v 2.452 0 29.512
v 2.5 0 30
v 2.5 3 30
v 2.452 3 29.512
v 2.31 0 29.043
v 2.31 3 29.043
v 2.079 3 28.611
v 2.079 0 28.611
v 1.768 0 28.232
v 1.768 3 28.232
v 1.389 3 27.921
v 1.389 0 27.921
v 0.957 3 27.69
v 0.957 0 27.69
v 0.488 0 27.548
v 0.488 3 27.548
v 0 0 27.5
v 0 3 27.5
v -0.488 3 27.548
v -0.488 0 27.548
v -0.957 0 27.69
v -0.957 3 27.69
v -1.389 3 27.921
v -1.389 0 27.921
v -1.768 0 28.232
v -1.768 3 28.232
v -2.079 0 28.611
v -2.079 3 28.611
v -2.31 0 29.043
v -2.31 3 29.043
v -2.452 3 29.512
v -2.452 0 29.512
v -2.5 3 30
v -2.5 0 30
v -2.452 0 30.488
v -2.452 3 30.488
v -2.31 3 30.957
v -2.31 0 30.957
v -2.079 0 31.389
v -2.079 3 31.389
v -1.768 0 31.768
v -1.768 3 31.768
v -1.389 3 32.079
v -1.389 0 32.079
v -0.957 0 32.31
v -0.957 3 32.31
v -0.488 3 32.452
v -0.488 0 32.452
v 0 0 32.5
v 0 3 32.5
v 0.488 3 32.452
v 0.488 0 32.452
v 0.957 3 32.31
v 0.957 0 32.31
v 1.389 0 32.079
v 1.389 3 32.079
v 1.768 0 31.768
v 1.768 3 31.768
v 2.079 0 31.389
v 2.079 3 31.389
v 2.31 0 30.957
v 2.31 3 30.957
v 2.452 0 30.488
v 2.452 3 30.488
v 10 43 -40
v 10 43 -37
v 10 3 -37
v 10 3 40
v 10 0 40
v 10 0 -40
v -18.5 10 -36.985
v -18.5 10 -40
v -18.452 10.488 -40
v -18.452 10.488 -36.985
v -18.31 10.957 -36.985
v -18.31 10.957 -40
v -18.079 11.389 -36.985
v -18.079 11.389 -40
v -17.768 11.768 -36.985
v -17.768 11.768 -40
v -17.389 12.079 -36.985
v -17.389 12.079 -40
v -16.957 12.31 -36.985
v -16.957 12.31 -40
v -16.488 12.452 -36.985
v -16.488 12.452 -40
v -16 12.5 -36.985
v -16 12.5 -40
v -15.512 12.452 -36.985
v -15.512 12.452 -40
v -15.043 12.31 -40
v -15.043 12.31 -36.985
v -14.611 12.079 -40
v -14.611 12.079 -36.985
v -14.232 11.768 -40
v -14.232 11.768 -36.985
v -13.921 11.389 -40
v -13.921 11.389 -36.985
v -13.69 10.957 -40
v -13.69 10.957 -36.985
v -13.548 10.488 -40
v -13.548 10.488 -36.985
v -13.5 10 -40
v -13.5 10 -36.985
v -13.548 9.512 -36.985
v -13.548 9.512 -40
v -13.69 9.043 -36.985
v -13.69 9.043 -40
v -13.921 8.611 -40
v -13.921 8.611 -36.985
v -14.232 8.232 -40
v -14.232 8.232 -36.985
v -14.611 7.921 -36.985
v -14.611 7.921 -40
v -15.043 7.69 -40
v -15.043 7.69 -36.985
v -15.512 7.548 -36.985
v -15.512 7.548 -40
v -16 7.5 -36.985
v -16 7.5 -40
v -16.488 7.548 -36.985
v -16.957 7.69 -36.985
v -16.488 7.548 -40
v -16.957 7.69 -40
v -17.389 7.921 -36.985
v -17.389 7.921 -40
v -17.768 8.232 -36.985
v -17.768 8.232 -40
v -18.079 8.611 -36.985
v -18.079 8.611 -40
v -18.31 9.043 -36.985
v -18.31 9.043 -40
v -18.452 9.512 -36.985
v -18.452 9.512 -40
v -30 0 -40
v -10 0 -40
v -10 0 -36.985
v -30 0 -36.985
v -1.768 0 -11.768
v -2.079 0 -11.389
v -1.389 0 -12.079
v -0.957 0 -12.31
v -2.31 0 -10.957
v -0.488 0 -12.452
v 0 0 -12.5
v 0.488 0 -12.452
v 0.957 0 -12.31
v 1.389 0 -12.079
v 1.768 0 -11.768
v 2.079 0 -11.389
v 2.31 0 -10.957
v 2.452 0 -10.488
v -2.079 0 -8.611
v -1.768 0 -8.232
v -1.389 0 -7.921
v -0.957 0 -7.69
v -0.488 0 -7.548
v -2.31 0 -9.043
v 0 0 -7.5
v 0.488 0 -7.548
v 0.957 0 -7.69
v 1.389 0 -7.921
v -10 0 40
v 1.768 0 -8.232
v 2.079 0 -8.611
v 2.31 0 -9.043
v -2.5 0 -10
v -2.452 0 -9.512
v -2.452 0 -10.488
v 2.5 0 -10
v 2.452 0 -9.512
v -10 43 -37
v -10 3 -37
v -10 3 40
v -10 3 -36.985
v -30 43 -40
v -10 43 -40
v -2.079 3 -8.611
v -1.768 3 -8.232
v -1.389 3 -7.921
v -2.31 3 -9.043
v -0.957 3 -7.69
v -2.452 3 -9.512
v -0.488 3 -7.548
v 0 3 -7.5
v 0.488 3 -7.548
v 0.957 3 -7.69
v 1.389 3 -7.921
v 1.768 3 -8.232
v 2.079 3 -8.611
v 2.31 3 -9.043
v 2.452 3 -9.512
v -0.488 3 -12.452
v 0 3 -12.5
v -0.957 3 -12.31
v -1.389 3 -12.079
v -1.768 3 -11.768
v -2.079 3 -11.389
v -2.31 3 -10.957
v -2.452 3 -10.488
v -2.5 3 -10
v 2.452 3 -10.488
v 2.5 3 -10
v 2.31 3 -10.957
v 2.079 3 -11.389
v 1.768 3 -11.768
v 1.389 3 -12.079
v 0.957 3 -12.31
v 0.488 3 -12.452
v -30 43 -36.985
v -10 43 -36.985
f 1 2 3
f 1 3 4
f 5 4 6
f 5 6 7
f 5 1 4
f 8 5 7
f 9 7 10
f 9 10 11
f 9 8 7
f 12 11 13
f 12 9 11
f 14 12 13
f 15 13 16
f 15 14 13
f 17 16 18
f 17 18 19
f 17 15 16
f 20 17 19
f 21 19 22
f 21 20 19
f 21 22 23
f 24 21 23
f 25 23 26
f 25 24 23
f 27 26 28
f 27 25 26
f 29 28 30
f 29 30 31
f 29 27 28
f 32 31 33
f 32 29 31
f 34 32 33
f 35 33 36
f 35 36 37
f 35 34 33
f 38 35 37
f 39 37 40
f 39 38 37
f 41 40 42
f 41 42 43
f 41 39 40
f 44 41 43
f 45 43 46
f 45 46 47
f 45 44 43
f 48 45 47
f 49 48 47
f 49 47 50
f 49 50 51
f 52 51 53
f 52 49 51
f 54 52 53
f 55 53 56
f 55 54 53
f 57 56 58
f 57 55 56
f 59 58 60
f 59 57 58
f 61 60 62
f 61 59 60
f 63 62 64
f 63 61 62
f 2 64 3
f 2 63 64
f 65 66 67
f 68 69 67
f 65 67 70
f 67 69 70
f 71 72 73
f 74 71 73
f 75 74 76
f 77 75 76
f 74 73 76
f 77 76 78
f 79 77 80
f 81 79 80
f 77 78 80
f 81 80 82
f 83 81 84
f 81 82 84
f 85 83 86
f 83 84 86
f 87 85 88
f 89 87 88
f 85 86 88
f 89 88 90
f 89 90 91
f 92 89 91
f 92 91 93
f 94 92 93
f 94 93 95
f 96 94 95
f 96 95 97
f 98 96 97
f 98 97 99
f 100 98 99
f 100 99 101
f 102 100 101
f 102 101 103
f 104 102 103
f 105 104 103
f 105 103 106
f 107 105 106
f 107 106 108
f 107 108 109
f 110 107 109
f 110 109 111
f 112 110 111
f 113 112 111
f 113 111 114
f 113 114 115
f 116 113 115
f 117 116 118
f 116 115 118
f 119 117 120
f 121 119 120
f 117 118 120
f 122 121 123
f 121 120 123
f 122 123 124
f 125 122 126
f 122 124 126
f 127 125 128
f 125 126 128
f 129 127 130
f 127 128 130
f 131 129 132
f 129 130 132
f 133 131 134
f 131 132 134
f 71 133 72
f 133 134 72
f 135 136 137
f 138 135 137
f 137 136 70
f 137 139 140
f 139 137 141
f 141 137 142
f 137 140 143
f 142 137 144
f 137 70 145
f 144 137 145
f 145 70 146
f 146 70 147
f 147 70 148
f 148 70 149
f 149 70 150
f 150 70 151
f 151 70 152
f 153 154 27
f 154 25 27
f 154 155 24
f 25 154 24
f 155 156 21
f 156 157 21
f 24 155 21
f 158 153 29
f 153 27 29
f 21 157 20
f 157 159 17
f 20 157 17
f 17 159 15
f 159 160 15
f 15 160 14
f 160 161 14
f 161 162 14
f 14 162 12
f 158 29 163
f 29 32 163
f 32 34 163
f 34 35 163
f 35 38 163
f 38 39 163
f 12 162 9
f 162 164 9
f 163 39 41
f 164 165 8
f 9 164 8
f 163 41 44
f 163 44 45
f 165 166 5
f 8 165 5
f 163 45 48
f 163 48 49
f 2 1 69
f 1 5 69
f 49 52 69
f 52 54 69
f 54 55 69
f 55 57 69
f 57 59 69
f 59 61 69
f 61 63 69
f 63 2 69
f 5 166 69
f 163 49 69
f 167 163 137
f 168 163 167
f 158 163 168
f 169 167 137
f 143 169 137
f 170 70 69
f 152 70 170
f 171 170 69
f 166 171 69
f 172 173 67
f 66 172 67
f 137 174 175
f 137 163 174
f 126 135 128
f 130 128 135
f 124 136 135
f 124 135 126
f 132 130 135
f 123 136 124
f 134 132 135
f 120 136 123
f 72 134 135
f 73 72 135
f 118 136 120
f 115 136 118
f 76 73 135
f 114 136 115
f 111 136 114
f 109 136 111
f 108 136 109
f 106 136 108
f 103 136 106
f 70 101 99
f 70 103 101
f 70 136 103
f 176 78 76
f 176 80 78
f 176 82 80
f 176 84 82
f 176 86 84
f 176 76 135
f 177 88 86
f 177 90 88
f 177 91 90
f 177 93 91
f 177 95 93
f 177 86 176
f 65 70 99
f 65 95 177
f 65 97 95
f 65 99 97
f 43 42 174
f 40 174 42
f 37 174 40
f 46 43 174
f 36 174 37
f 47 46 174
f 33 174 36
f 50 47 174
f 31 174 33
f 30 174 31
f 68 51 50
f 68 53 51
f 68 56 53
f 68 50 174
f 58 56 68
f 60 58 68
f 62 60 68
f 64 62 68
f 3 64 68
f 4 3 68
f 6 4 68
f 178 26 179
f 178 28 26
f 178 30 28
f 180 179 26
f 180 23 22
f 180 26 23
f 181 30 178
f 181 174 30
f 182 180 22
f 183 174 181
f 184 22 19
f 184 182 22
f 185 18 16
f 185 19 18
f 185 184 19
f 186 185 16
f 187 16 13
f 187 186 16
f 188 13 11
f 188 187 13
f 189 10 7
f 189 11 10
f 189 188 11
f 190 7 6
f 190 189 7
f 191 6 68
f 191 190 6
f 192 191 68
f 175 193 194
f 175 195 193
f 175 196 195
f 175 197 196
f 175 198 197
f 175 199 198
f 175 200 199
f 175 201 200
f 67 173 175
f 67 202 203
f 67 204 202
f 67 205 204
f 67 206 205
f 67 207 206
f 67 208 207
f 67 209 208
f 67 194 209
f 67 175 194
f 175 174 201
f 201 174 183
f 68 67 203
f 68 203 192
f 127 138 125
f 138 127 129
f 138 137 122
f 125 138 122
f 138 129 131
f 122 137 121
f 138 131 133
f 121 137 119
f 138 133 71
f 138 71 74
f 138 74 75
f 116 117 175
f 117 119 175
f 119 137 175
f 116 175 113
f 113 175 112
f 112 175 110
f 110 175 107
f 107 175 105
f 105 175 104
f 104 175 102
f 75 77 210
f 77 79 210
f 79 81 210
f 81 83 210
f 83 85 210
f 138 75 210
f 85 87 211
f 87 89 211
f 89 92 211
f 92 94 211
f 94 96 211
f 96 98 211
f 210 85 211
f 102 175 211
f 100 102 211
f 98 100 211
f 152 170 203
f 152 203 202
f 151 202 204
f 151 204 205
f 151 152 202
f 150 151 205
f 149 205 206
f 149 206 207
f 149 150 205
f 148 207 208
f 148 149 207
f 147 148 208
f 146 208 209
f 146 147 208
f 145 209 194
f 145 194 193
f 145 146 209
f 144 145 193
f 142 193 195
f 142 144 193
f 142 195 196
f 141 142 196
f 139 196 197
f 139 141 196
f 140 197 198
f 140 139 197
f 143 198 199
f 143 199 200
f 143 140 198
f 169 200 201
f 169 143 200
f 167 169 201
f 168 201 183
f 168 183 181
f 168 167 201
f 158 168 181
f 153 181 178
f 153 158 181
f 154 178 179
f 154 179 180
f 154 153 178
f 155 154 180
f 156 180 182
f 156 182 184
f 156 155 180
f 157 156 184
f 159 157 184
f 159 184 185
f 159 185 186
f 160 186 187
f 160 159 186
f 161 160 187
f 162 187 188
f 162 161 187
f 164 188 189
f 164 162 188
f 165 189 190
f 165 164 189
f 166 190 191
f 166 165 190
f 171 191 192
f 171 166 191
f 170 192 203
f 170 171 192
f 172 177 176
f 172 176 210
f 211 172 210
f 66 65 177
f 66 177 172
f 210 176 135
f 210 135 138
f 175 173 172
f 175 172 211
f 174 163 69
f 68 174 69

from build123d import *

# Parameters (mm, degrees)
SKETCH1_W           = 20
SKETCH1_H           = 80
SKETCH1_R           = 2.5
BOSS_EXTRUDE1_DEPTH = 3
SKETCH2_W           = 20
SKETCH2_H           = 3
BOSS_EXTRUDE2_DEPTH = 40
SKETCH4_W           = 3.015323491
SKETCH4_H           = 43
BOSS_EXTRUDE4_DEPTH = 20
SKETCH7_R           = 2.5
CUT_EXTRUDE2_DEPTH  = 20


with BuildPart() as part:
    # Sketch1 → Boss-Extrude1 (new body)
    with BuildSketch(Plane(origin=(0, 0, 0), x_dir=(1, 0, 0), z_dir=(0, 1, 0))):
        Rectangle(SKETCH1_W, SKETCH1_H)
        with Locations((0, -30)):
            Circle(SKETCH1_R, mode=Mode.SUBTRACT)
        with Locations((0, 10)):
            Circle(SKETCH1_R, mode=Mode.SUBTRACT)
    extrude(amount=BOSS_EXTRUDE1_DEPTH)

    # Sketch2 → Boss-Extrude2 (add)
    with BuildSketch(Plane(origin=(0, 3, 0), x_dir=(1, 0, 0), z_dir=(0, 1, 0))):
        with Locations((0, 38.5)):
            Rectangle(SKETCH2_W, SKETCH2_H)
    extrude(amount=BOSS_EXTRUDE2_DEPTH)

    # Sketch4 → Boss-Extrude4 (add)
    with BuildSketch(Plane.ZY.offset(10)):
        with Locations((-38.492338254, 21.5)):
            Rectangle(SKETCH4_W, SKETCH4_H)
    extrude(amount=BOSS_EXTRUDE4_DEPTH)

    # Sketch7 → Cut-Extrude2 (cut)
    with BuildSketch(Plane(origin=(0, 0, -40), x_dir=(-1, 0, 0), z_dir=(0, 0, -1))):
        with Locations((16, 10)):
            Circle(SKETCH7_R)
    extrude(amount=-CUT_EXTRUDE2_DEPTH, mode=Mode.SUBTRACT)


solid = part.part
